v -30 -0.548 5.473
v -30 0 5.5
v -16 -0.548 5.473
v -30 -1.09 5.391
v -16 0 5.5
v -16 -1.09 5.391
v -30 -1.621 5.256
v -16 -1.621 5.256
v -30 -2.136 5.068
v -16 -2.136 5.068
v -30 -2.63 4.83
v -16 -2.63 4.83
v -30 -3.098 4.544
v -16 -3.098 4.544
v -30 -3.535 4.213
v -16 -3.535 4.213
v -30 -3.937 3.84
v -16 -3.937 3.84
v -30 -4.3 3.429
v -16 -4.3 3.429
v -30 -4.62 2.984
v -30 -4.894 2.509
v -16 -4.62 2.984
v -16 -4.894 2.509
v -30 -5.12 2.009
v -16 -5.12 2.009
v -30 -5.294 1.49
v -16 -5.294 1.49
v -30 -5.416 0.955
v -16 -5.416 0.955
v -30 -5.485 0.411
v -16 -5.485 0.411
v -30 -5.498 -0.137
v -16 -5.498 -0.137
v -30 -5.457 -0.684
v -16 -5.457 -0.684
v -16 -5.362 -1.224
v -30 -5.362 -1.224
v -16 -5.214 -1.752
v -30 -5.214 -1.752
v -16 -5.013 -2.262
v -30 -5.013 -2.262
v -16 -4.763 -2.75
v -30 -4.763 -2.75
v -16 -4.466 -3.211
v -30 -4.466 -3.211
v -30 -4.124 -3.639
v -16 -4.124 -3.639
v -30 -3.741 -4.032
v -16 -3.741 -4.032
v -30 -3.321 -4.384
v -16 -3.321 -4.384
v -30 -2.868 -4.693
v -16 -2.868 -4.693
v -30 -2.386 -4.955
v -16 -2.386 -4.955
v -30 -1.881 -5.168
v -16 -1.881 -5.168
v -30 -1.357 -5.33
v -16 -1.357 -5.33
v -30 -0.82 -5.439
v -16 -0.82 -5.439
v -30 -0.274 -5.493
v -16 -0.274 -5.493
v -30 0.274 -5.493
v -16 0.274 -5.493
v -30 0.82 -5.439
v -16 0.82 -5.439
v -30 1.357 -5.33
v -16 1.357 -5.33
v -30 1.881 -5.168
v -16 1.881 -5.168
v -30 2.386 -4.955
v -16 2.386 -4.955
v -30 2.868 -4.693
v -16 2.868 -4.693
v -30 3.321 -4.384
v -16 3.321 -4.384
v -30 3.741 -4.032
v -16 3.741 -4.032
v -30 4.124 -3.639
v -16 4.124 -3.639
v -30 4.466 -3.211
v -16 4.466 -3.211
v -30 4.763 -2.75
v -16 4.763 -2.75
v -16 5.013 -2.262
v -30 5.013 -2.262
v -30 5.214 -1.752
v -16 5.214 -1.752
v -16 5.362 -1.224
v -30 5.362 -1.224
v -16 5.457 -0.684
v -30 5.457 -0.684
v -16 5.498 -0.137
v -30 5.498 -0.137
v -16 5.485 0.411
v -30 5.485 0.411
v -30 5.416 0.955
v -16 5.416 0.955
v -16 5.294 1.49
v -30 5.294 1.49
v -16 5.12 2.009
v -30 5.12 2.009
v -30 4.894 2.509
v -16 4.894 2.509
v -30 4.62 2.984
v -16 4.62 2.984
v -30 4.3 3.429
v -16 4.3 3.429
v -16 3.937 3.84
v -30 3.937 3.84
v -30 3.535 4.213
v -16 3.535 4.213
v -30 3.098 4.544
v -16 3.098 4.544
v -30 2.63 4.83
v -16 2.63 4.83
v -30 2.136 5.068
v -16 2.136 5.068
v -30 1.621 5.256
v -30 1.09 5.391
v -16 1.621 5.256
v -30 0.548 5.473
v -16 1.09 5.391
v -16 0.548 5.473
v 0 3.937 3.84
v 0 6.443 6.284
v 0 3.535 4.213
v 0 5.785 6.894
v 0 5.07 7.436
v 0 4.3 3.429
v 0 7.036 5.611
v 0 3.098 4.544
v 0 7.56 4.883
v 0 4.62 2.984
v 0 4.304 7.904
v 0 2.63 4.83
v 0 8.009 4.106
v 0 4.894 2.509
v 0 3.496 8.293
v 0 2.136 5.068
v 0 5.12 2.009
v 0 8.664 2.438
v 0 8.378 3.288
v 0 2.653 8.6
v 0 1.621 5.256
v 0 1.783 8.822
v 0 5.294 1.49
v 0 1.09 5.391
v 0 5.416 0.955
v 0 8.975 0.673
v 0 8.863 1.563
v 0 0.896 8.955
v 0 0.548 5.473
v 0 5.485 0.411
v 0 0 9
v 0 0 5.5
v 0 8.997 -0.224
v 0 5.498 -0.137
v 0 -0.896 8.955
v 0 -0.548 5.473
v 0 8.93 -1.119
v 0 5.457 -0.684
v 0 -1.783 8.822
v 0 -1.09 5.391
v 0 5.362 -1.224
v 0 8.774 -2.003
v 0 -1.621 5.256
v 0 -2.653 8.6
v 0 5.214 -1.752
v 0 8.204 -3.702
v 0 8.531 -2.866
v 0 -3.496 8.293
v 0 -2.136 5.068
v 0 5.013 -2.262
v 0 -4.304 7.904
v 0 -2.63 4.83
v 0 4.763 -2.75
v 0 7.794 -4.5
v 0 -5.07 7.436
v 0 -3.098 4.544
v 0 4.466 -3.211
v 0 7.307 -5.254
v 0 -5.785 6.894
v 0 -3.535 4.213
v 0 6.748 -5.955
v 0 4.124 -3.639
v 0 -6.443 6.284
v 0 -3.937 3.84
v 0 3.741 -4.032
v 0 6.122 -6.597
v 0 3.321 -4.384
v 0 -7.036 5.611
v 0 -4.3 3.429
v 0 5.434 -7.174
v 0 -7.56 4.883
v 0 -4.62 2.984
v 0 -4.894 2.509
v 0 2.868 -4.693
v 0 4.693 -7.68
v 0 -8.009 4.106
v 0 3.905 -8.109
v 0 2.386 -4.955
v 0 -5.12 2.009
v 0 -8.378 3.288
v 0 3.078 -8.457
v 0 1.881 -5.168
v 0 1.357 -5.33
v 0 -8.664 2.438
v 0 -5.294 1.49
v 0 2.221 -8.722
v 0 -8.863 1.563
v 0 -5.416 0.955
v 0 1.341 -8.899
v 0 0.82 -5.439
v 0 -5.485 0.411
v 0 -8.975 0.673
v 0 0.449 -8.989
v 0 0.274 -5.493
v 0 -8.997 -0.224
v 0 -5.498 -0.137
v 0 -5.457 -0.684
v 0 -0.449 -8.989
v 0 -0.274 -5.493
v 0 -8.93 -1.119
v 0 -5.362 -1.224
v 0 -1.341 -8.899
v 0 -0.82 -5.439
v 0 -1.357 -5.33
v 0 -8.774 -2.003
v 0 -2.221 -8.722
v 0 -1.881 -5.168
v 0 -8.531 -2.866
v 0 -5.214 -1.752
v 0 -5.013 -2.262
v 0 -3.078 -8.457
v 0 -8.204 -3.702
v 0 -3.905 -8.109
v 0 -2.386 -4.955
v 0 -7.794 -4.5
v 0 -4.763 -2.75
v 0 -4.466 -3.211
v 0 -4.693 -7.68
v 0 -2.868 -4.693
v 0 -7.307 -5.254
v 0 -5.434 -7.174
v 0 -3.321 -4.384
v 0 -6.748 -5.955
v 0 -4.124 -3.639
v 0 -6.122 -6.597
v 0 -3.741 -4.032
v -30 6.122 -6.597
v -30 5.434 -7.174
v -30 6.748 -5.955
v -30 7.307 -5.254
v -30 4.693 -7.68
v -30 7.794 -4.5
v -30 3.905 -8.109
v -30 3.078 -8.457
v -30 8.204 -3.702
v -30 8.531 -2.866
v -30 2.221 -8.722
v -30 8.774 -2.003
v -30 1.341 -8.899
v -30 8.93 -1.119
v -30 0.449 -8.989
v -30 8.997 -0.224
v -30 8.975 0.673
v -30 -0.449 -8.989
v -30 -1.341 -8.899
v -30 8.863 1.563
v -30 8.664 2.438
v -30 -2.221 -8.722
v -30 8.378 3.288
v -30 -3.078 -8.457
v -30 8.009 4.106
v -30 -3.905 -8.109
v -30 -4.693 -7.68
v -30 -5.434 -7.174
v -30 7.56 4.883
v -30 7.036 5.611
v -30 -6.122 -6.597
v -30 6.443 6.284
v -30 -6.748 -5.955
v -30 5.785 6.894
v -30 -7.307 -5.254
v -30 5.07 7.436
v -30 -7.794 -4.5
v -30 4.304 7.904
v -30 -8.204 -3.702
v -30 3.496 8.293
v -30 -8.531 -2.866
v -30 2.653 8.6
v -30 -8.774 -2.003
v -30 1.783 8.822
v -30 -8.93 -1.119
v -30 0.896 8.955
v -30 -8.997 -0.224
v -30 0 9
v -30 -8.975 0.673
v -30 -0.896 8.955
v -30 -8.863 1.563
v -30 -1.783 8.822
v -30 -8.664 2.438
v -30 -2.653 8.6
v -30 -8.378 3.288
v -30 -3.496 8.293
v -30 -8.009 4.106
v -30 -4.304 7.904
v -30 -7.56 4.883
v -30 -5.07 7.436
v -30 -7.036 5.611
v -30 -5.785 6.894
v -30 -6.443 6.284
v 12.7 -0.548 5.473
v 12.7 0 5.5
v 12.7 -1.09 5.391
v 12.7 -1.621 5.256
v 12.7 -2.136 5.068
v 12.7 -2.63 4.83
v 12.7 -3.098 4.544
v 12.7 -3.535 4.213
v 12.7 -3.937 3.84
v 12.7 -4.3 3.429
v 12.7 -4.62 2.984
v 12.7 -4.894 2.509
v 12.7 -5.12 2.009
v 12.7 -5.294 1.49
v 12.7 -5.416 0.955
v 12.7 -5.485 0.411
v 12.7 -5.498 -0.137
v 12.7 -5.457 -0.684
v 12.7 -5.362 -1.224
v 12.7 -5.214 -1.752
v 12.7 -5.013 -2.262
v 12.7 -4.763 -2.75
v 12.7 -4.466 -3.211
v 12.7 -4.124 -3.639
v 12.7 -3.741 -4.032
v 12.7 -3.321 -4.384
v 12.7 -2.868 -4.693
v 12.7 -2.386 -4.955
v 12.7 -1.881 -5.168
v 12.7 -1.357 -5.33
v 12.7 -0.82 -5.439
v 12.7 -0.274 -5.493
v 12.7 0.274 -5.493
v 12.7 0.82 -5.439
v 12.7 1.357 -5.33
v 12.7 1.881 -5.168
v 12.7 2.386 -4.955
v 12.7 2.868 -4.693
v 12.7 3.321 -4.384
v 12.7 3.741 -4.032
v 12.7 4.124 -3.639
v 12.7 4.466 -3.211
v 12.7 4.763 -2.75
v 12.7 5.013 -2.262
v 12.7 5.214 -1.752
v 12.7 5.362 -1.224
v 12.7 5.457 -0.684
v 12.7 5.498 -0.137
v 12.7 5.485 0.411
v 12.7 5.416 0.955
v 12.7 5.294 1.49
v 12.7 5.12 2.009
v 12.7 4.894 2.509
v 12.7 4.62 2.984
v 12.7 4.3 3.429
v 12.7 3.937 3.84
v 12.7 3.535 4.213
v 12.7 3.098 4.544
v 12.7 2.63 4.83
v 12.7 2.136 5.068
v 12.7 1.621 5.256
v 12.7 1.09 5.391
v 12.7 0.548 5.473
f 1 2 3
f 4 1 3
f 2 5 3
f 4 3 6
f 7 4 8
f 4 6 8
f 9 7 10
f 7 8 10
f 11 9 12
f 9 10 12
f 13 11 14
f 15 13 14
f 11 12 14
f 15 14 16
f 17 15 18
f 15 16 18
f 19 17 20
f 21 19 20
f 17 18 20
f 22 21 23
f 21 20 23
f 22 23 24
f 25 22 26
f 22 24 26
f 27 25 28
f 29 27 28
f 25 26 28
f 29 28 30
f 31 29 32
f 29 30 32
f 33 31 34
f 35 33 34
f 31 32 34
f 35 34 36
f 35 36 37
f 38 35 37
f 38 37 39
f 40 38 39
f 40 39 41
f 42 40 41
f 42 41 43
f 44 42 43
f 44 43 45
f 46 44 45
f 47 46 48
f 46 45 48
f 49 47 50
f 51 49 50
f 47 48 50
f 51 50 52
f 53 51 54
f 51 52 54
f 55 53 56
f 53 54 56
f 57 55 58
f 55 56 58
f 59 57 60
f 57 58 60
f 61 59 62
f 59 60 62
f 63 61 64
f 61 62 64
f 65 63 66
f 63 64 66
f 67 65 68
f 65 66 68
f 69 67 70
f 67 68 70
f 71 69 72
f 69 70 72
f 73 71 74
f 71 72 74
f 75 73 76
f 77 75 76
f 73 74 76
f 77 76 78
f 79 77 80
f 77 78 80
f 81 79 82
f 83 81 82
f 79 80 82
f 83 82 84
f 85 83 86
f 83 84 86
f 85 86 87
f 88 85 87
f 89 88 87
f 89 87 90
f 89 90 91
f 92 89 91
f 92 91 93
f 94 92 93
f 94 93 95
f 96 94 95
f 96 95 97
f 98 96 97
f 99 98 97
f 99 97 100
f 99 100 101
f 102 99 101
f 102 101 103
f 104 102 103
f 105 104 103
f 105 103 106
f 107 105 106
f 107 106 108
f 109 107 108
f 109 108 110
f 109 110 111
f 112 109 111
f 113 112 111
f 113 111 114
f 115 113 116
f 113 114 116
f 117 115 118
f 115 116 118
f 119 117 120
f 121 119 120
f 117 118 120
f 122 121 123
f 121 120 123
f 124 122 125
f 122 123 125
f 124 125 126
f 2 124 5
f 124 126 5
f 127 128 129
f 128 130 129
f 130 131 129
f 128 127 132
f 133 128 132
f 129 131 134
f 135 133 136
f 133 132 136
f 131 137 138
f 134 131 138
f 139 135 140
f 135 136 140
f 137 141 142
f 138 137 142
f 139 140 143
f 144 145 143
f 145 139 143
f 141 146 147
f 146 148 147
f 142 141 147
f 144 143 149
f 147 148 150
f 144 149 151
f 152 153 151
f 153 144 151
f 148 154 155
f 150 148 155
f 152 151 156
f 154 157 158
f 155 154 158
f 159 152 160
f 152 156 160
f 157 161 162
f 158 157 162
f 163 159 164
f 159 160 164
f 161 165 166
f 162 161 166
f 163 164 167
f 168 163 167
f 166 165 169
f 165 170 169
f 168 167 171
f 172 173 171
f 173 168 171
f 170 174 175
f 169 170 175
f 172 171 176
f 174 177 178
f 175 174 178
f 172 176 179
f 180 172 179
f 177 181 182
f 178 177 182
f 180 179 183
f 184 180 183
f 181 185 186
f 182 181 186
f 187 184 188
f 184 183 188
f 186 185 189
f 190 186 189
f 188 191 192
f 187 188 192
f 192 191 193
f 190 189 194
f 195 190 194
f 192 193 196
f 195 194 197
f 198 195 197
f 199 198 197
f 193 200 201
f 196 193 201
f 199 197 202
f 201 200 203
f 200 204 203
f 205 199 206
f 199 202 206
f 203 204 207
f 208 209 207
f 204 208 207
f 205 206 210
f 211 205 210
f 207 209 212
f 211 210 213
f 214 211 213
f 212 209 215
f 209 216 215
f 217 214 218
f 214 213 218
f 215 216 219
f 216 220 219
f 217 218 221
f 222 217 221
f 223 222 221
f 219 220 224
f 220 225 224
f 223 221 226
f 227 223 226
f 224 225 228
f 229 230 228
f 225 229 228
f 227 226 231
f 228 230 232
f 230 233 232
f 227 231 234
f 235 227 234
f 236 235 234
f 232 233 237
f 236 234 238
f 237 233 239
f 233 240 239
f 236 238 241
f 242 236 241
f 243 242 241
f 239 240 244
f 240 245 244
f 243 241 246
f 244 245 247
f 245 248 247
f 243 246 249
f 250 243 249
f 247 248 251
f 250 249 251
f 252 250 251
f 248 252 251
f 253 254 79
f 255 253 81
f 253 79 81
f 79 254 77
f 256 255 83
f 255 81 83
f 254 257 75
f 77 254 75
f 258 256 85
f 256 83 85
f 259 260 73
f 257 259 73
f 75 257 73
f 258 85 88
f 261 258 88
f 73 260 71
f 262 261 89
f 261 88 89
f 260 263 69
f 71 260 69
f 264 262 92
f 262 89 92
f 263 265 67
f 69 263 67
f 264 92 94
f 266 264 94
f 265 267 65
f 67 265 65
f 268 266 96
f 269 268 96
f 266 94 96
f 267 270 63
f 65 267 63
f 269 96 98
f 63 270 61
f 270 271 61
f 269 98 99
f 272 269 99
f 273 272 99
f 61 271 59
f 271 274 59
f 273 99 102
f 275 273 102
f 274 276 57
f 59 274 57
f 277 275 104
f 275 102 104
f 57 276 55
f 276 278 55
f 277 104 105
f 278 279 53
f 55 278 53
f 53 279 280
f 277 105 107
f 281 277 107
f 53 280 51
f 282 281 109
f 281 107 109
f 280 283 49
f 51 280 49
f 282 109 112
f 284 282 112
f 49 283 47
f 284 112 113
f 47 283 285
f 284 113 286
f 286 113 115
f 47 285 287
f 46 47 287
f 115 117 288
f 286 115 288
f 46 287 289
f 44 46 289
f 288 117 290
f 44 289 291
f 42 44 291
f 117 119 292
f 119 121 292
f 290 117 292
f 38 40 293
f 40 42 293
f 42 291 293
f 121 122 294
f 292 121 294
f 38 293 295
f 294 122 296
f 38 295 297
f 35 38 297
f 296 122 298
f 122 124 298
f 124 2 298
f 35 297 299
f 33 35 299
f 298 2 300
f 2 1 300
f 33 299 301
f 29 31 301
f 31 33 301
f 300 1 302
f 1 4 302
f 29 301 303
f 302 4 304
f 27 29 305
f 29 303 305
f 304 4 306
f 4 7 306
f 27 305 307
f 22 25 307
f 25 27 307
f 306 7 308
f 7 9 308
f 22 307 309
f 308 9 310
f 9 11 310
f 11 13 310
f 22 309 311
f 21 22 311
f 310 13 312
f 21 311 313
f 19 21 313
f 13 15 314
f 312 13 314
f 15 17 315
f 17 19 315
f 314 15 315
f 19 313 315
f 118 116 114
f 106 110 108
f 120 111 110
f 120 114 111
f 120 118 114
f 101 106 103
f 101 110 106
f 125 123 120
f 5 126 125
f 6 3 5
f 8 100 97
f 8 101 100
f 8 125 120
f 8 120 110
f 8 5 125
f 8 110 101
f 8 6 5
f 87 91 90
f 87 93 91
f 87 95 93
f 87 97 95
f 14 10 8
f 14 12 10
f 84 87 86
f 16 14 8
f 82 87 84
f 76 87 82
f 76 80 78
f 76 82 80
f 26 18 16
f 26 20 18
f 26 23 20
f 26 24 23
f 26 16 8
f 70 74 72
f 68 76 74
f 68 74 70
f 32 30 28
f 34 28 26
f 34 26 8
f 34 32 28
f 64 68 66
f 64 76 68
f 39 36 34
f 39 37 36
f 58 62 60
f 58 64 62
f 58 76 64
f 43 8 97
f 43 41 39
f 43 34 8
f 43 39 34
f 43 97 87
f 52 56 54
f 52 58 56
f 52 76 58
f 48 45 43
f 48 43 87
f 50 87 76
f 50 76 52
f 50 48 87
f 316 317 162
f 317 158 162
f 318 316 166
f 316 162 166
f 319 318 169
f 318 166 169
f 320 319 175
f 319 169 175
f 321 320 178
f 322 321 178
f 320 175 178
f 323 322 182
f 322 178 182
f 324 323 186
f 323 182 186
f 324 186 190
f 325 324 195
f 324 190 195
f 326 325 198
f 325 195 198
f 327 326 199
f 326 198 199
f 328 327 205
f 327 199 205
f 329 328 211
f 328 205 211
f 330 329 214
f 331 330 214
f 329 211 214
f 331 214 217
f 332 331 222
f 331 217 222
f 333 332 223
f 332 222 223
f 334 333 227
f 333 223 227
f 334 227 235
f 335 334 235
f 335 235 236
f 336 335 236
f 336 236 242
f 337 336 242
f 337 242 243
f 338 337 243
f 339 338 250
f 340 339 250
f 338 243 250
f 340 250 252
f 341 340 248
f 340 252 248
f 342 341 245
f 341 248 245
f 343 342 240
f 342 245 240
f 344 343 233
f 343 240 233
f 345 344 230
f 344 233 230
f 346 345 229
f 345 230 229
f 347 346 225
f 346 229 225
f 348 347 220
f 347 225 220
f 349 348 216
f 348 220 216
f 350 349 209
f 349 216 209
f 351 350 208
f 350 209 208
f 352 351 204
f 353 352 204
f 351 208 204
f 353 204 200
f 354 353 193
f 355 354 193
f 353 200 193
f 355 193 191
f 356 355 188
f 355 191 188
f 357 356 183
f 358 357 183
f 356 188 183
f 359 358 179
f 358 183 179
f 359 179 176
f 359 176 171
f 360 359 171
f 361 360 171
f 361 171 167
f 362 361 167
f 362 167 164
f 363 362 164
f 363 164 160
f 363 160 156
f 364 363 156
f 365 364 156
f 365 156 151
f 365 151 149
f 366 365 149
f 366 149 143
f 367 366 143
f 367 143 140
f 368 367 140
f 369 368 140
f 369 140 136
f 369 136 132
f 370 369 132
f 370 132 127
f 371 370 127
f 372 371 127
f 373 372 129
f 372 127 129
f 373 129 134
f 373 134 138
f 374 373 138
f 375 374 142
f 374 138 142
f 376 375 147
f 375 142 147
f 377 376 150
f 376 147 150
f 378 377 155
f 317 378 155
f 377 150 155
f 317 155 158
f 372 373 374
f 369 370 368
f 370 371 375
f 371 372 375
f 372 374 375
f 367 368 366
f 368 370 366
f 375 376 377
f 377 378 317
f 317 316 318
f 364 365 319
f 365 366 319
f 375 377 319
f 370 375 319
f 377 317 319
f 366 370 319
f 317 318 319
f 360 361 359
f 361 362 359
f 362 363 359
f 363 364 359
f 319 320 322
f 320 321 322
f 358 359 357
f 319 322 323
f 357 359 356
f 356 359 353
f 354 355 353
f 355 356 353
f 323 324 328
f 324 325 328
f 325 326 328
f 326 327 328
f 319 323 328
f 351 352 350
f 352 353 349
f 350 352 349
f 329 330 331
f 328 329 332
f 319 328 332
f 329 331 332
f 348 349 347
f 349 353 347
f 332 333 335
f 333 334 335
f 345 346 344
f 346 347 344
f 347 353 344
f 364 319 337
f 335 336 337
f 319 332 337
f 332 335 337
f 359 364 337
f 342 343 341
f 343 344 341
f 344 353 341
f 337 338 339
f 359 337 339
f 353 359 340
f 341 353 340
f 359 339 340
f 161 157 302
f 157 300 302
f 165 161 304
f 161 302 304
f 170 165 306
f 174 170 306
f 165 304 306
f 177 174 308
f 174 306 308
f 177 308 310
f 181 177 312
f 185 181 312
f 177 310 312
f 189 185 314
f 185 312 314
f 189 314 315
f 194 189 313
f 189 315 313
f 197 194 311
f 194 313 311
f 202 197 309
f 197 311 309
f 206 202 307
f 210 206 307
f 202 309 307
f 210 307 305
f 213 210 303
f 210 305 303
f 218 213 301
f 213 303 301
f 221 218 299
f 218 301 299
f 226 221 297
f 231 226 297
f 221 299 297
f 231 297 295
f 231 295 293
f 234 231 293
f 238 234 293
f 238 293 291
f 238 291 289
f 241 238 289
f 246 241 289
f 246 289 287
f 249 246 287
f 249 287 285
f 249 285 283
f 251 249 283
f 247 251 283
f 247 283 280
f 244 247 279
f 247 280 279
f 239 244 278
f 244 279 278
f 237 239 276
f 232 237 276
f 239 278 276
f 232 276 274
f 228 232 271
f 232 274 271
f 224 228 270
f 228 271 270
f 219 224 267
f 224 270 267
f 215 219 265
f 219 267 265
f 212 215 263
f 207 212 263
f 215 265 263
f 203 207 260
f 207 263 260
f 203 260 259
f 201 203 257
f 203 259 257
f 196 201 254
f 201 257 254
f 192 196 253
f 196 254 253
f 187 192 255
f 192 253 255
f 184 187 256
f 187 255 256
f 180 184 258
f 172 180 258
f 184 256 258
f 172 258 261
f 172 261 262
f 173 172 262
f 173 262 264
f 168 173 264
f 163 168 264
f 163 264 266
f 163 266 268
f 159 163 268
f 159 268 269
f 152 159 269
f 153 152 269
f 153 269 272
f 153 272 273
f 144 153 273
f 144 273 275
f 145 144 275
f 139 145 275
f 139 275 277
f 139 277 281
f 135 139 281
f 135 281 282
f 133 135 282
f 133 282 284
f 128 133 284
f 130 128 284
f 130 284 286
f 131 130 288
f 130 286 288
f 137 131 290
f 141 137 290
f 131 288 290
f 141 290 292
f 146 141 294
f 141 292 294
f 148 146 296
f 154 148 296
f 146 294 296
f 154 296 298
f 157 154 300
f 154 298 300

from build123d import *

# Parameters (mm, degrees)
SOCKET_1_SKETCH_W = 15
SOCKET_1_SKETCH_H = 5.5


with BuildPart() as part:
    # NPT_Ext_30 Sketch → NPT_Ext_30 (revolve)
    with BuildSketch(Plane.XY):
        Polygon((12.7, 0), (12.7, 5.5), (0, 5.5), (0, 9), (-30, 9), (-30, 0), align=None)
    revolve(axis=Axis((-1000, 0, 0), (1, 0, 0)))

    # Socket 1 Sketch → Socket 1 (revolve, cut)
    with BuildSketch(Plane.XY):
        with Locations((-23.5, 2.75)):
            Rectangle(SOCKET_1_SKETCH_W, SOCKET_1_SKETCH_H)
    revolve(axis=Axis((-1000, 0, 0), (1, 0, 0)), mode=Mode.SUBTRACT)


solid = part.part
